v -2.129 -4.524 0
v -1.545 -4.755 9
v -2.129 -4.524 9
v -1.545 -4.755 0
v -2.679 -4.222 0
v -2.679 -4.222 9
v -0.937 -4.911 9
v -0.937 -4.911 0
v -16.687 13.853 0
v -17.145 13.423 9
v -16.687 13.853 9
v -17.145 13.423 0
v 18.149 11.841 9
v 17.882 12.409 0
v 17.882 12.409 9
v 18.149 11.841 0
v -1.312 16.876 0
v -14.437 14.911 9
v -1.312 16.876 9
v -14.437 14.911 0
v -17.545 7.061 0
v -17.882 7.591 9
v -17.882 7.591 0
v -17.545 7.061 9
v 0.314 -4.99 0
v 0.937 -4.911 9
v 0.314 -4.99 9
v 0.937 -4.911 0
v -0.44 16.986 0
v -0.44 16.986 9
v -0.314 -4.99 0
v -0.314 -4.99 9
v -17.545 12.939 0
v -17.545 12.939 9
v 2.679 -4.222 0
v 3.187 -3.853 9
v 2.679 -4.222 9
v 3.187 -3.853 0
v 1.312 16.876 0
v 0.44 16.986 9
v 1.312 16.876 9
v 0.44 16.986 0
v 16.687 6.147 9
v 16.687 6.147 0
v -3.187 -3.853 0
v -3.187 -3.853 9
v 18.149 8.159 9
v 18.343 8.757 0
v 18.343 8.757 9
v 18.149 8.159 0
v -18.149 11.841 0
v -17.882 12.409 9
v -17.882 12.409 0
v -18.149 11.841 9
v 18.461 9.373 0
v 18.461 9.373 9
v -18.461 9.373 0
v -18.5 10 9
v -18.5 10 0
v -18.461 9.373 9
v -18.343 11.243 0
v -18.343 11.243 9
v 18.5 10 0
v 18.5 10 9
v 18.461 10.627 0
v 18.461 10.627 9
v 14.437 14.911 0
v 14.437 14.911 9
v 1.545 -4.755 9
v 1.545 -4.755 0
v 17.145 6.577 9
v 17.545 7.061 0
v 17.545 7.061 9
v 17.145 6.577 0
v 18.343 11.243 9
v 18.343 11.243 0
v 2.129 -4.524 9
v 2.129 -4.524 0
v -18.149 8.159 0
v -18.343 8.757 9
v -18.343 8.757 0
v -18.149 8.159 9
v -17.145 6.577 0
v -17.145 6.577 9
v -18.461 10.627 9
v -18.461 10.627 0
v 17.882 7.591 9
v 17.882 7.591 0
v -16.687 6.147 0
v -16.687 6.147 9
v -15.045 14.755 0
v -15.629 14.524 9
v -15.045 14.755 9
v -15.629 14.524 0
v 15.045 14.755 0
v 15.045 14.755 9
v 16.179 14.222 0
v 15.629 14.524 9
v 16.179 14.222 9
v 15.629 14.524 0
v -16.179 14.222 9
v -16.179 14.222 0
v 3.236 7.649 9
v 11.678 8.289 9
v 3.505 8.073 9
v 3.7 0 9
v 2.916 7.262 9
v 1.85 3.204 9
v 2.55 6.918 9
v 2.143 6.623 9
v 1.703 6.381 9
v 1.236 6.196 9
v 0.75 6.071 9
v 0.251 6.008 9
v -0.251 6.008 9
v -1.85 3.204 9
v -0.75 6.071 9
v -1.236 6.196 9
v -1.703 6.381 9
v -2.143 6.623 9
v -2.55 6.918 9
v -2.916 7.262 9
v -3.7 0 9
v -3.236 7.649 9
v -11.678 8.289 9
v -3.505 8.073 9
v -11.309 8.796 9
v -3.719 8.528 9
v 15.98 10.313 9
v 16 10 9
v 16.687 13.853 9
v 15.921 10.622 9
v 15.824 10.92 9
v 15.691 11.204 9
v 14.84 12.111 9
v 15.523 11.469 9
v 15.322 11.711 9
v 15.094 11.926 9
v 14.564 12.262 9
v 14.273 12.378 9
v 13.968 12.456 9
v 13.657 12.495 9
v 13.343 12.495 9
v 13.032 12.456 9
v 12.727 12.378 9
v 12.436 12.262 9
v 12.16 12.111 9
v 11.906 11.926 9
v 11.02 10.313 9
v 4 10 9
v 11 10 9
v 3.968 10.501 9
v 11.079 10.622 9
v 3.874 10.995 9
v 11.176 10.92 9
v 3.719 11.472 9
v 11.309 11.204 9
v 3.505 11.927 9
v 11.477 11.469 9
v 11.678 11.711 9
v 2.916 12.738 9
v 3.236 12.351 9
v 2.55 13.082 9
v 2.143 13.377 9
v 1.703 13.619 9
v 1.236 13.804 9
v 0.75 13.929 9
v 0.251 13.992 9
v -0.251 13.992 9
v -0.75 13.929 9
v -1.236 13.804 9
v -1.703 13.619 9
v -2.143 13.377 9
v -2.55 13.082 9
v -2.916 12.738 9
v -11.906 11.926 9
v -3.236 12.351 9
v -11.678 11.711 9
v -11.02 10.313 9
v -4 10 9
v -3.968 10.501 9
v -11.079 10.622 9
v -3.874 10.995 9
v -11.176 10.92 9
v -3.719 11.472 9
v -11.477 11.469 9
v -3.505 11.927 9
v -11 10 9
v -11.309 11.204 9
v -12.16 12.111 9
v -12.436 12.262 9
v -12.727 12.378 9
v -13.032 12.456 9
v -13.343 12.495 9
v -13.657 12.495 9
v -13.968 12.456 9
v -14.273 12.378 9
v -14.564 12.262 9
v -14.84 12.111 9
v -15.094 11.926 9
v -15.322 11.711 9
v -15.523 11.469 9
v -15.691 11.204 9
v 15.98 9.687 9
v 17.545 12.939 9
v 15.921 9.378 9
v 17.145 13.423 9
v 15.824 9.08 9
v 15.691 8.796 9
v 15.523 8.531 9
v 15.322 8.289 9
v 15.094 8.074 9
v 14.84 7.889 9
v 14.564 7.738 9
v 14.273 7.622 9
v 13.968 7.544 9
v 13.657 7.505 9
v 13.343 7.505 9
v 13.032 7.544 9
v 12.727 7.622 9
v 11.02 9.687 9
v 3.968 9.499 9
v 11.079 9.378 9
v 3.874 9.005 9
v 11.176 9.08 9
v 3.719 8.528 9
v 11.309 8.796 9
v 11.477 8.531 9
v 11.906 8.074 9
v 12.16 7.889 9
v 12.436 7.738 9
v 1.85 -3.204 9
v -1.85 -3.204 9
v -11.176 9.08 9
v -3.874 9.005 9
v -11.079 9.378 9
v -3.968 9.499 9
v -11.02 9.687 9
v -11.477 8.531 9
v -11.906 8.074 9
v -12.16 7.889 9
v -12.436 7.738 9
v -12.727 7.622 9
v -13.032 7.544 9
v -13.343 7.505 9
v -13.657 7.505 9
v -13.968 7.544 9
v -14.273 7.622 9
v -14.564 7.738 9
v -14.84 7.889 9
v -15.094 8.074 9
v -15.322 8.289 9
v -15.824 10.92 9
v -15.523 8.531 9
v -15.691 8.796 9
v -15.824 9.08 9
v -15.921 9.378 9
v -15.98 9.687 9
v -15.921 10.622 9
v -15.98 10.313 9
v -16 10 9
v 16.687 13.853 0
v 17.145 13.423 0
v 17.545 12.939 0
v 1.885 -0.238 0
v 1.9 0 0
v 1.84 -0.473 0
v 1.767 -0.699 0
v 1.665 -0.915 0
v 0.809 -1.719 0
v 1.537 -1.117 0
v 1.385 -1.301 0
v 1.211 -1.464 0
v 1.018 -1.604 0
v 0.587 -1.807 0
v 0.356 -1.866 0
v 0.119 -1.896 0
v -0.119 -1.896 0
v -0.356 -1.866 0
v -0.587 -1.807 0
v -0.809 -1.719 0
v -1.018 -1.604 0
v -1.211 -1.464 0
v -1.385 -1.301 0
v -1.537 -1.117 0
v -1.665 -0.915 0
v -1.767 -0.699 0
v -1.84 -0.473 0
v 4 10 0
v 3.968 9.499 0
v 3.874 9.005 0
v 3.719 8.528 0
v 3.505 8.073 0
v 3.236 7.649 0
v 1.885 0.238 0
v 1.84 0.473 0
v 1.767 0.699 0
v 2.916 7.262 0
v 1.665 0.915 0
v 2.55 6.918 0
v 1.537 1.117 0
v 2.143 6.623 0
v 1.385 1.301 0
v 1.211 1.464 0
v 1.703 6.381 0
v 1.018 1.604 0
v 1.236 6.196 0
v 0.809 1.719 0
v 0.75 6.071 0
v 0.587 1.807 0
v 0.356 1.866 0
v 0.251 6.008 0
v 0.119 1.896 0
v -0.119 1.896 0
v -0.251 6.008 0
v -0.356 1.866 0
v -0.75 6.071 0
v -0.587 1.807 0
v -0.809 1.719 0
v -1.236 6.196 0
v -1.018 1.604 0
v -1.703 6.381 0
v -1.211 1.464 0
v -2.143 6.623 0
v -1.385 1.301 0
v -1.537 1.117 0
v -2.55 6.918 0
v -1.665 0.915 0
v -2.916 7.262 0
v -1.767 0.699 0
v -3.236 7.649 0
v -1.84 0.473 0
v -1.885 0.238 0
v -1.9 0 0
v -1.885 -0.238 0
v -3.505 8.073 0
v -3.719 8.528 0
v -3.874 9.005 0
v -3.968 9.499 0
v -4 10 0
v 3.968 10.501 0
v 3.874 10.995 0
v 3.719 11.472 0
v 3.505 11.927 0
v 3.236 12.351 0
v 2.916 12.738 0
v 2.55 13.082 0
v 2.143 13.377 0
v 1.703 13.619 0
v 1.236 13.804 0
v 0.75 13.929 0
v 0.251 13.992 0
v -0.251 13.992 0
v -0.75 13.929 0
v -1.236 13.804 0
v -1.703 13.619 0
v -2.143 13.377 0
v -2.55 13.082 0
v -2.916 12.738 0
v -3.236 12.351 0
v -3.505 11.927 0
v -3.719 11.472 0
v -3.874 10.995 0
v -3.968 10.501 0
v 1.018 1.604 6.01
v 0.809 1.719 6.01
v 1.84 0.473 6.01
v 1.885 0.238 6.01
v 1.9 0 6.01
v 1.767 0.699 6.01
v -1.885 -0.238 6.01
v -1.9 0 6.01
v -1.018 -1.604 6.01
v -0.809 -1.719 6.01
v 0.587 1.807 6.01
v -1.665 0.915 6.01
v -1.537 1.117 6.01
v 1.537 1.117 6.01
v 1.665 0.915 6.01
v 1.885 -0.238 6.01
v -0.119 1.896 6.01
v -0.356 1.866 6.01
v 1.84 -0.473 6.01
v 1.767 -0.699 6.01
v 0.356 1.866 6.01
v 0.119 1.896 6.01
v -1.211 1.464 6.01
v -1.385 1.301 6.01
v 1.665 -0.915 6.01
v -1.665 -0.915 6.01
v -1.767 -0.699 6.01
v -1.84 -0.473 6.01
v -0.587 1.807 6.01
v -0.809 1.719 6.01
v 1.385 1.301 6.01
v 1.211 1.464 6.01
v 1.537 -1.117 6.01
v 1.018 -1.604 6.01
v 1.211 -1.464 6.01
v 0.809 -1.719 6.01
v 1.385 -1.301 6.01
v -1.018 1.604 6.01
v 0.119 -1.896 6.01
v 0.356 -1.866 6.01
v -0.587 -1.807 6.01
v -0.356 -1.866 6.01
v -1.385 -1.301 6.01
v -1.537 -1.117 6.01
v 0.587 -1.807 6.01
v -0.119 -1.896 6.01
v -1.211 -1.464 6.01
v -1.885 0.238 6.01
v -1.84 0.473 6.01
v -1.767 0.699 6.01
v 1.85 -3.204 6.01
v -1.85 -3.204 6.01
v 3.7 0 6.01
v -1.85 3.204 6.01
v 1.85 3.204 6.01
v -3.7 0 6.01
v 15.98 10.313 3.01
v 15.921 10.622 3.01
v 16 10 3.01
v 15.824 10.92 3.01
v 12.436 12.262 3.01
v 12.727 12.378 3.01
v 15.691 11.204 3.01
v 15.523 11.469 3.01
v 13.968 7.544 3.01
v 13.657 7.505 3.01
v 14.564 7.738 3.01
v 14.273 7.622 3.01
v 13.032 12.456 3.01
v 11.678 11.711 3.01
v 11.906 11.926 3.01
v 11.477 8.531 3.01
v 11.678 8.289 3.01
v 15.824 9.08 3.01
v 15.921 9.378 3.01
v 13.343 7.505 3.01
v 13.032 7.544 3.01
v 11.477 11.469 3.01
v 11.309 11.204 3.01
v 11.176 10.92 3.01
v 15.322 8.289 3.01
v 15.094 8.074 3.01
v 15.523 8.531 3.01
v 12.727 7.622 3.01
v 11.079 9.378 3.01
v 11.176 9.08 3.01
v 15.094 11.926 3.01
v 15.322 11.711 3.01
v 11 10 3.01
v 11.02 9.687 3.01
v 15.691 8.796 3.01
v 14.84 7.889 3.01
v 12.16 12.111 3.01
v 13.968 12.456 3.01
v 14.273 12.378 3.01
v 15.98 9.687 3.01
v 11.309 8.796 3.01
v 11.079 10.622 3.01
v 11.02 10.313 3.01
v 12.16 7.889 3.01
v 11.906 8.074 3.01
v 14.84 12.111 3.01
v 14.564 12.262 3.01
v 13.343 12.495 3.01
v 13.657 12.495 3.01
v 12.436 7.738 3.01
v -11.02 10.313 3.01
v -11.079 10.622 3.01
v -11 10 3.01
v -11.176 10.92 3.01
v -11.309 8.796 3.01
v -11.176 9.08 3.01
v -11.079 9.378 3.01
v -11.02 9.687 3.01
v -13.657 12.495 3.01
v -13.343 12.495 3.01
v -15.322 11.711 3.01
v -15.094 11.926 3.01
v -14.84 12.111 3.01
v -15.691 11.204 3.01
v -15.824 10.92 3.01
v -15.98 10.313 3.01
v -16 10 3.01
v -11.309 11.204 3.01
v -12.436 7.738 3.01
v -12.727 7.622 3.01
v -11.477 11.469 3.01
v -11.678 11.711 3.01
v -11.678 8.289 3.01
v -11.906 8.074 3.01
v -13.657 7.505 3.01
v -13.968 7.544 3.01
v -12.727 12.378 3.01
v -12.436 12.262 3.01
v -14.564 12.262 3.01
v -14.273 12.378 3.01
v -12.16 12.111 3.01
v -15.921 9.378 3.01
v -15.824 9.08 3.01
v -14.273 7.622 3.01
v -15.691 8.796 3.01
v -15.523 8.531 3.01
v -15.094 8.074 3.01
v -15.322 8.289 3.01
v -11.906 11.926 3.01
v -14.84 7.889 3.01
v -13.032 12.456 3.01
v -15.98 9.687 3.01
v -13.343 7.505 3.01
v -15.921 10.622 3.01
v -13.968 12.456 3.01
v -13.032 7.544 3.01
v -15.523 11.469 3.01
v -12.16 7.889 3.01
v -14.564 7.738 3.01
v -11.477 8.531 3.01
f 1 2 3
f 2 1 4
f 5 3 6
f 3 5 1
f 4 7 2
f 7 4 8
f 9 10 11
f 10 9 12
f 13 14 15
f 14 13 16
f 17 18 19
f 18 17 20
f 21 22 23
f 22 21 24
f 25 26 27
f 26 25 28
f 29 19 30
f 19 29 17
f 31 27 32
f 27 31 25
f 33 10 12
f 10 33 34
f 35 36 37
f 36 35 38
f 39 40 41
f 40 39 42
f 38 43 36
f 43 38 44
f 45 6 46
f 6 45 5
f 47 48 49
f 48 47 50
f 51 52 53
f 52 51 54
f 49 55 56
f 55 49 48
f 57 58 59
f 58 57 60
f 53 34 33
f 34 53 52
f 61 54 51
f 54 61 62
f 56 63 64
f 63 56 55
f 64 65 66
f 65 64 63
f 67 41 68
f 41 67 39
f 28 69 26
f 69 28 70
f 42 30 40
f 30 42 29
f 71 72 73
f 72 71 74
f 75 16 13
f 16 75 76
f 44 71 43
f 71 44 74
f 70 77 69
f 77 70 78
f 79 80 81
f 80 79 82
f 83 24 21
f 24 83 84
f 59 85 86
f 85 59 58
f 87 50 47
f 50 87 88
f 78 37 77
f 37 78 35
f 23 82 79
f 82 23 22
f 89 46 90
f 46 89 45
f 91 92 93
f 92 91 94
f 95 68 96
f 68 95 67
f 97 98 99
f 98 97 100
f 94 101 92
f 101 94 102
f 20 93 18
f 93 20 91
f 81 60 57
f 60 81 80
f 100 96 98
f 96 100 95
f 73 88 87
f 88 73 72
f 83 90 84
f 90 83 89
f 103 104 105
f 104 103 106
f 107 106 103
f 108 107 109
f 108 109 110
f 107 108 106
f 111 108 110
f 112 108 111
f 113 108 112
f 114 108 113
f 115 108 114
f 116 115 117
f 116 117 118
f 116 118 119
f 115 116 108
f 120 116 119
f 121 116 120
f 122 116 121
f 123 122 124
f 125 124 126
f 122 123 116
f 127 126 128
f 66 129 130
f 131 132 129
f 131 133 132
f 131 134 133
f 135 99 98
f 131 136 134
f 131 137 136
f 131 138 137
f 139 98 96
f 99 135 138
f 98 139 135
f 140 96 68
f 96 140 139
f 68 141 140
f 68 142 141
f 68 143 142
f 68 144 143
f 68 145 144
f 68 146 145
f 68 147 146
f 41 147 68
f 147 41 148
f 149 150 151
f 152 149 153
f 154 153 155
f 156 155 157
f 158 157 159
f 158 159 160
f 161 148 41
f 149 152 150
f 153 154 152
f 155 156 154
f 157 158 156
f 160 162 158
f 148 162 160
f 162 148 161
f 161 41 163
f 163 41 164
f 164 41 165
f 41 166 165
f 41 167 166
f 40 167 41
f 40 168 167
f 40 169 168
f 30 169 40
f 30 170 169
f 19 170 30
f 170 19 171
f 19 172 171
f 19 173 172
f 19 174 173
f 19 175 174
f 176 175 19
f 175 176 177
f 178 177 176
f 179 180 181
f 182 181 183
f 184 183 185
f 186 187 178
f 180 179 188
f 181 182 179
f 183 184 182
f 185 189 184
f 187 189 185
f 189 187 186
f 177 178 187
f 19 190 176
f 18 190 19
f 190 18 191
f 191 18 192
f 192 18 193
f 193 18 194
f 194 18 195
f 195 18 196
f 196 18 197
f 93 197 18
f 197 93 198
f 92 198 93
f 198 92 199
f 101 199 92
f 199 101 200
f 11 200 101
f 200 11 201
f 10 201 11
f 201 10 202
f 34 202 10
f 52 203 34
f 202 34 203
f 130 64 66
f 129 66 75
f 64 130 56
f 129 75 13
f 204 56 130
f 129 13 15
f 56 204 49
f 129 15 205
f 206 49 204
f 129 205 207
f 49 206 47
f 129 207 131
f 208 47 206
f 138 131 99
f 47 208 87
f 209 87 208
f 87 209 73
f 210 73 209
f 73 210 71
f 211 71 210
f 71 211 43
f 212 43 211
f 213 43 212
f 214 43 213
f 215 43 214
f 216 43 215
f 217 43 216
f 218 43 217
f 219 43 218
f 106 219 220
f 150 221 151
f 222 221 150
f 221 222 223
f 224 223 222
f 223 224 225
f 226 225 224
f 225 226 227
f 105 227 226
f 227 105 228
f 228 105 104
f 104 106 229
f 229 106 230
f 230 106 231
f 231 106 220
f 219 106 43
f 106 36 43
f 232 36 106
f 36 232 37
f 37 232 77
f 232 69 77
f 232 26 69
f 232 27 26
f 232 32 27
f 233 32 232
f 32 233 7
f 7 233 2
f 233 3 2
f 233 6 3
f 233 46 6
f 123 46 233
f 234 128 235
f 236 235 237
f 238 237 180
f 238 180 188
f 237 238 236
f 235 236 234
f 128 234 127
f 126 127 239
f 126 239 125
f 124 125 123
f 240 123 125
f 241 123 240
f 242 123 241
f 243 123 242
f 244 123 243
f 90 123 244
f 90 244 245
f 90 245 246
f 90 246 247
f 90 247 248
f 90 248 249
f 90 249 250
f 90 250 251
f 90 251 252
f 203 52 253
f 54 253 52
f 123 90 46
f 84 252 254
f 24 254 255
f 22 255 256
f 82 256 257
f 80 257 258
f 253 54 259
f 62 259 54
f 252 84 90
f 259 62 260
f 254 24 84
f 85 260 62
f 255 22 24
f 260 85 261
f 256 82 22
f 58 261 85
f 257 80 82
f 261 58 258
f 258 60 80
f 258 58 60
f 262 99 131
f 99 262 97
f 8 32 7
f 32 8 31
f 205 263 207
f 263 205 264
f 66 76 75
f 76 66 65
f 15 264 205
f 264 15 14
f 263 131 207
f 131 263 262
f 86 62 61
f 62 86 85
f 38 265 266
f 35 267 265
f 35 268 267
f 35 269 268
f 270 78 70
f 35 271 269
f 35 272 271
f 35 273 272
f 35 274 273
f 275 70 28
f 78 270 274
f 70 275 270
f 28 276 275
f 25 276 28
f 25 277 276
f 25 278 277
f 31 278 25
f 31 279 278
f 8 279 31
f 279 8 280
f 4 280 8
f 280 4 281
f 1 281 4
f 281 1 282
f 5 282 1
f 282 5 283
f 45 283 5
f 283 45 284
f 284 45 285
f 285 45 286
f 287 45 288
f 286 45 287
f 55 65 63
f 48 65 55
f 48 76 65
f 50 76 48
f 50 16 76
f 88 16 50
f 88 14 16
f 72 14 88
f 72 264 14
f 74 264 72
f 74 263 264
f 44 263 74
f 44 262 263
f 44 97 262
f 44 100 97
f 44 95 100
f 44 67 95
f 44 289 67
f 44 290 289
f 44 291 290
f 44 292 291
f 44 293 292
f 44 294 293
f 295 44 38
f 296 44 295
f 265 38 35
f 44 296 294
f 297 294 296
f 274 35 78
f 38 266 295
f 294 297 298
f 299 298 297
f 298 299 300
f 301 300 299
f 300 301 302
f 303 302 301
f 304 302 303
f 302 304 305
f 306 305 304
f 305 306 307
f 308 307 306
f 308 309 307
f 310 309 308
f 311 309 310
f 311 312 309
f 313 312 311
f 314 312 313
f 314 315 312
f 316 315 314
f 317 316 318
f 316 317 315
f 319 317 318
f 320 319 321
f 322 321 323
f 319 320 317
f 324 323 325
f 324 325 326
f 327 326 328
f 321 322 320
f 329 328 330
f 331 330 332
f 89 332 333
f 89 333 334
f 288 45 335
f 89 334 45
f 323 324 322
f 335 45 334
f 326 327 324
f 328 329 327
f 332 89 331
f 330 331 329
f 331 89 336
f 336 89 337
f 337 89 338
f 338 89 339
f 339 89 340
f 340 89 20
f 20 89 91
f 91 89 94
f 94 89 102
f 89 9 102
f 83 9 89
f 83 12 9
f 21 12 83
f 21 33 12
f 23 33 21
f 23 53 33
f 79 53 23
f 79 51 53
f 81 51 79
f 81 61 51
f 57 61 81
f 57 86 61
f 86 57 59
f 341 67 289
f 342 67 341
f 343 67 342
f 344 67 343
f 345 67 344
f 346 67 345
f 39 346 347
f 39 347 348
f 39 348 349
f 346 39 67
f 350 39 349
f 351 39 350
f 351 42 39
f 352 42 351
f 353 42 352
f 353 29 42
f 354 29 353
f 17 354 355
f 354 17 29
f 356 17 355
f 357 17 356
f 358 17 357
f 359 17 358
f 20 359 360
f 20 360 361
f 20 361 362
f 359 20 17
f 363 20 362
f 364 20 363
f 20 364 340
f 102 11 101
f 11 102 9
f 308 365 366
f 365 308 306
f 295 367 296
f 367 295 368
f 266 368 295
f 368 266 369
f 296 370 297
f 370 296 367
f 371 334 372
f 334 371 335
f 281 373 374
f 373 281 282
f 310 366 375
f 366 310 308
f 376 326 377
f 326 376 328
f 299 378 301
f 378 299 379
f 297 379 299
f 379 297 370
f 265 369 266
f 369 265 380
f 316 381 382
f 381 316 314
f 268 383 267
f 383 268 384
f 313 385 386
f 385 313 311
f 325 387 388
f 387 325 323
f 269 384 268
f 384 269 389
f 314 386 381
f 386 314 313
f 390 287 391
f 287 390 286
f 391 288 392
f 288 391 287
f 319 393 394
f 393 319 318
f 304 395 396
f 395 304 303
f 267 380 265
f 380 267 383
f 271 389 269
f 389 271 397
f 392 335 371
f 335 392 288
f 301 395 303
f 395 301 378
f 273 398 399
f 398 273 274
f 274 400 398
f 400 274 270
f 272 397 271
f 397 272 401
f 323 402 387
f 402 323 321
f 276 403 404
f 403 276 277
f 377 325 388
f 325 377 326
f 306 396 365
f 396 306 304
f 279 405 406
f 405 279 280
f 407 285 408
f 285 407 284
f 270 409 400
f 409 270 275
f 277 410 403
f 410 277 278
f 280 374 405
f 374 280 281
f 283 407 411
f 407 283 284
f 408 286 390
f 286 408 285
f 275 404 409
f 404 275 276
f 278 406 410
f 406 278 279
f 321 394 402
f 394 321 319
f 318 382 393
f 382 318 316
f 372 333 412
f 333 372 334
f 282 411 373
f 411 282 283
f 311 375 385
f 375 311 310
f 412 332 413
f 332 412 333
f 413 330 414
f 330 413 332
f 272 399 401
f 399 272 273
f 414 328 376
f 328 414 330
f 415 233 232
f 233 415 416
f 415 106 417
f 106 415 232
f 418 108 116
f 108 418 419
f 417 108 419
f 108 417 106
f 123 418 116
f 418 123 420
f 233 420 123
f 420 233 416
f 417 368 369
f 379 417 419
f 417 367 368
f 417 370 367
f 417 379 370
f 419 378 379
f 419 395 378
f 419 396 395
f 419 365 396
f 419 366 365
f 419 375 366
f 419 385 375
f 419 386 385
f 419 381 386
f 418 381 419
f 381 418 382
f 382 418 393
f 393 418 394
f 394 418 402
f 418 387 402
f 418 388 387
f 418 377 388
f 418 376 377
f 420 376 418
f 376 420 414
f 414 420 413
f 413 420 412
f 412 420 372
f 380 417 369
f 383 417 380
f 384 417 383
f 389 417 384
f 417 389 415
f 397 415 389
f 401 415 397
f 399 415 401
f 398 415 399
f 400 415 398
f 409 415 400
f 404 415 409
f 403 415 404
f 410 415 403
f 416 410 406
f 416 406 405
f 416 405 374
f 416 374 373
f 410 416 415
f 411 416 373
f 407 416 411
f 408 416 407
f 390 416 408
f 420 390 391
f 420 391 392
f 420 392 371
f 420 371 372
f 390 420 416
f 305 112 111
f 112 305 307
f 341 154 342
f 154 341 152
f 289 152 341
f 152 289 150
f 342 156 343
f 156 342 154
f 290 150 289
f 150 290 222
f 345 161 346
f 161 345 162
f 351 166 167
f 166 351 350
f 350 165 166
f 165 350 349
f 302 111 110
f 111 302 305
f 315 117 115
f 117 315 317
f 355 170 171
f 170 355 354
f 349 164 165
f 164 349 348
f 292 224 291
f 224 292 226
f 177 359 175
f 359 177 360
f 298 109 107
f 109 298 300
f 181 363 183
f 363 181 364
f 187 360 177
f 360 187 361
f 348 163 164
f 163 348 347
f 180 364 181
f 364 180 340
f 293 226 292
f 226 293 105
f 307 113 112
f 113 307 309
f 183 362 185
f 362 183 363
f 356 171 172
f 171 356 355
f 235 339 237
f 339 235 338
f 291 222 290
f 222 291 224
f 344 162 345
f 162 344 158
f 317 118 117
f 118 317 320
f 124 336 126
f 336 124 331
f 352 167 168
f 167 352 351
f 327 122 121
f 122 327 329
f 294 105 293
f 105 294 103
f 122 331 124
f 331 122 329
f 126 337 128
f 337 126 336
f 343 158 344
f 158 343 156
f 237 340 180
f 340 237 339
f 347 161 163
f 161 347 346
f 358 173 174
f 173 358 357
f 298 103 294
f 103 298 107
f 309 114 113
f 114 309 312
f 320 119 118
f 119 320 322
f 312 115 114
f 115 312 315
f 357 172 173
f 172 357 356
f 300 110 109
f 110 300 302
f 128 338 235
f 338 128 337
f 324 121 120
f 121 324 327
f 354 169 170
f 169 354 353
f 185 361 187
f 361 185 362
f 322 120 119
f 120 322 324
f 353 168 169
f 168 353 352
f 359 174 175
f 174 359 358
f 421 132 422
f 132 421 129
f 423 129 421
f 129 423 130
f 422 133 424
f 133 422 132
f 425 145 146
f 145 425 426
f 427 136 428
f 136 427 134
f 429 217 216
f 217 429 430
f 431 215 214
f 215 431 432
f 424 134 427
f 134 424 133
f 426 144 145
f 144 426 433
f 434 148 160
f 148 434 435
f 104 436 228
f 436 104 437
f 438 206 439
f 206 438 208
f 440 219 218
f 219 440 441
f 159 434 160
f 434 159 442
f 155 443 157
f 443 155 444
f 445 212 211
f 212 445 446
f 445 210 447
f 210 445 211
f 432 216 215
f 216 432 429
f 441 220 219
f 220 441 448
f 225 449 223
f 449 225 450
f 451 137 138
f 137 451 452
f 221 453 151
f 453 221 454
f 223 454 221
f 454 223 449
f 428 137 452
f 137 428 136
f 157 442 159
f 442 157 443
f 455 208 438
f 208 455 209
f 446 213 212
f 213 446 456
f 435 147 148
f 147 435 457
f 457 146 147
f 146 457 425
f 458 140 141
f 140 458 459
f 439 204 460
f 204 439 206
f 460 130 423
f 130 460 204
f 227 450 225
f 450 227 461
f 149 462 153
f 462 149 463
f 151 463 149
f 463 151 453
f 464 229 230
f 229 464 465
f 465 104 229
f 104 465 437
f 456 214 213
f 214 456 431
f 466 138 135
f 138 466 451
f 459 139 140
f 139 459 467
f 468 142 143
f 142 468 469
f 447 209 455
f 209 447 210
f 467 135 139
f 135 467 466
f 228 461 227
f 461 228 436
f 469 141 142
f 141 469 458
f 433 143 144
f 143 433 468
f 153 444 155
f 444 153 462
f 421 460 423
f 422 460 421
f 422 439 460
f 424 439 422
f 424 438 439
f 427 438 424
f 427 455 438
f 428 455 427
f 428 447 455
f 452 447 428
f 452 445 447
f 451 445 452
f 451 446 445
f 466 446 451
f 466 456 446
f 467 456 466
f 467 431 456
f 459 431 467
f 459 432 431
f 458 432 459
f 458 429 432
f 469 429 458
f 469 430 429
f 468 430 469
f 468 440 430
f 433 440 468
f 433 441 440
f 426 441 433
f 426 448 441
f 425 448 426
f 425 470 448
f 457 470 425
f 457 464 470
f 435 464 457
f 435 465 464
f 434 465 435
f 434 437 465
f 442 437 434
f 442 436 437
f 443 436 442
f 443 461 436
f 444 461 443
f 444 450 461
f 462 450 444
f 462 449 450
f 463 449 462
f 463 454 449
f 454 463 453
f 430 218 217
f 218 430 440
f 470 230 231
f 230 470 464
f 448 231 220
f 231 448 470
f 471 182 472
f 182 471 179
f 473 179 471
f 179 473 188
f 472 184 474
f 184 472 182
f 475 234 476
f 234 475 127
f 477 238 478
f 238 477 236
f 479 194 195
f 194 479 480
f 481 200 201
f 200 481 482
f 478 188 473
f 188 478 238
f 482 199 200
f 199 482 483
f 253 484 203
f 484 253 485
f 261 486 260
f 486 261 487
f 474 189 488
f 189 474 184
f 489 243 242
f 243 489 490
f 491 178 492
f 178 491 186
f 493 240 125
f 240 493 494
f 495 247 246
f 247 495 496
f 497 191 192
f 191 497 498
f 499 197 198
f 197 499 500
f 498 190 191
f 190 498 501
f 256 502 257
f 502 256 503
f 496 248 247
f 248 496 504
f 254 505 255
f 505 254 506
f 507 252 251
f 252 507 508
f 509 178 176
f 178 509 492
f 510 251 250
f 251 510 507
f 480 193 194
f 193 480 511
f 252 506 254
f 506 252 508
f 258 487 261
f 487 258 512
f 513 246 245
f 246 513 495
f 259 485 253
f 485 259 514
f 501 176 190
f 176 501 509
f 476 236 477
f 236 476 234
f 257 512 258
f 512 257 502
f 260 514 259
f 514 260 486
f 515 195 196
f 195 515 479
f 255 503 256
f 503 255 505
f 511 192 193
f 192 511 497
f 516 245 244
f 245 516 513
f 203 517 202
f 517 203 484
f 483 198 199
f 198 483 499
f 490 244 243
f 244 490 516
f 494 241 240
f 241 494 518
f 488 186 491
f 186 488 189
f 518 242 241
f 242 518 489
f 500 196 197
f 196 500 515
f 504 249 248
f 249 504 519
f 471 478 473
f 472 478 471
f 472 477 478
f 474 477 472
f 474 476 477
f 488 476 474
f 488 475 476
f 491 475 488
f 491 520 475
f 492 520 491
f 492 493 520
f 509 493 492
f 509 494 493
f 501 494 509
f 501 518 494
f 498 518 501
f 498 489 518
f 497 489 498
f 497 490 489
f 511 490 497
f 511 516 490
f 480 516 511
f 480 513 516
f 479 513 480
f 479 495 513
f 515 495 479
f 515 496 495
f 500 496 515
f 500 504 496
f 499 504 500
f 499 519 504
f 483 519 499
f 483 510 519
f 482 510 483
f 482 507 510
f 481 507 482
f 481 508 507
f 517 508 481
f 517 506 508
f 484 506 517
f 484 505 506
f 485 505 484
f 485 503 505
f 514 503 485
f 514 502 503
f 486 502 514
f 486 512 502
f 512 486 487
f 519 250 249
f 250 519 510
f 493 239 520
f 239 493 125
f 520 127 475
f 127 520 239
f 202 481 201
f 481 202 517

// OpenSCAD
// file: esp32_cam_mb_enclosure_common.scad
// common values for esp32_cam_mb_enclosure

boxFrontPanelThickness=2.25;
boxSideWallThickness=1.5;

backPlateWallThickness=1.5;

boxInnerHeight=41;
boxInnerWidth=28;
boxInnerDepth=21;

mountClipSlotHeight=15.5;  // positioned relative to boxInnerHeight
mountClipSlotDepth=2; // positioned relative to boxInnerDepth
mountClipSlotHeightPosition=17;  // bottom of the slot
mountClipSlotInsetFromBack=7; // rearmost edge


// calculated
boxOuterWidth=boxInnerWidth+boxSideWallThickness*2;
boxOuterHeight=boxInnerHeight+boxSideWallThickness*2;
boxOuterDepth=boxInnerDepth+boxFrontPanelThickness;

usbAccessHoleWidth=11;  // centered relative to boxInnerWidth

resetButtonAccessHoleHeight=6;

mountClipHingeOuterDia=10;
mountClipHingeInnerDia=3.8;

/*
 * The inner dia of the mount-clip hinge is 3.8, so...
 * Asked https://www.perplexity.ai : "what is the outer diameter of an m4 nut"
 * and it pulled info from boltdepot's web site to yield the answer 7.2mm.
 * The value here has a bit of margin to avoid fitting too tightly.
 */
m4NutCountersinkDia=7.4;
// main file
// esp32cam_mb_enclosure - tripod adapter
// add threaded rod to use the hinge hole 

include <esp32_cam_mb_enclosure_common.scad>

adapterThickness=9;  // minimum that will accomodate a nutsert for 1/4 x 20

// brass threaded insert 1/4-20 outer dia is 9mm, so this needs to be slightly smaller
tripodHoleInnerDia=8;
tripodHoleWallThickness=3;
tripodHoleOuterDia=tripodHoleInnerDia+tripodHoleWallThickness*2;

antiRotationPinRadius=13.5; // from center of tripod mount - per online ref and measured from manfroto plate
antiRotationPinHoleDia=5; // measured from manfroto plate

tripodHoleInset=mountClipHingeOuterDia;

overlap=0.01;
$fn=50;

difference() {
    hull() {
        cylinder(d=mountClipHingeOuterDia, h=adapterThickness);
        translate([0,tripodHoleInset,0])
            cylinder(d=tripodHoleOuterDia, h=adapterThickness);
        // anti-rotation pin base "wing" 1
        translate([antiRotationPinRadius,tripodHoleInset,0])
            cylinder(d=antiRotationPinHoleDia*2, h=adapterThickness);
        // anti-rotation pin base "wing" 2
        translate([-antiRotationPinRadius,tripodHoleInset,0])
            cylinder(d=antiRotationPinHoleDia*2, h=adapterThickness);

    }
    // hinge threaded-rod through hole
    translate([0,0,-overlap])
        cylinder(d=mountClipHingeInnerDia, h=adapterThickness+overlap*2);
    // hinge threaded-rod hex-nut-countersink
    translate([0,0,adapterThickness*2/3+overlap])
        cylinder(d=m4NutCountersinkDia, h=adapterThickness/3+overlap, $fn=6);

    // tripod 1/4"-20 threaded insert hole
    translate([0,tripodHoleInset,-overlap])
        cylinder(d=tripodHoleInnerDia, h=adapterThickness+overlap*2);

    // anti-rotation pin hole 1
    translate([antiRotationPinRadius,tripodHoleInset,adapterThickness/3+overlap])
        cylinder(d=antiRotationPinHoleDia, h=adapterThickness*2/3+overlap);
    // anti-rotation pin hole 2
    translate([-antiRotationPinRadius,tripodHoleInset,adapterThickness/3+overlap])
        cylinder(d=antiRotationPinHoleDia, h=adapterThickness*2/3+overlap);

}
